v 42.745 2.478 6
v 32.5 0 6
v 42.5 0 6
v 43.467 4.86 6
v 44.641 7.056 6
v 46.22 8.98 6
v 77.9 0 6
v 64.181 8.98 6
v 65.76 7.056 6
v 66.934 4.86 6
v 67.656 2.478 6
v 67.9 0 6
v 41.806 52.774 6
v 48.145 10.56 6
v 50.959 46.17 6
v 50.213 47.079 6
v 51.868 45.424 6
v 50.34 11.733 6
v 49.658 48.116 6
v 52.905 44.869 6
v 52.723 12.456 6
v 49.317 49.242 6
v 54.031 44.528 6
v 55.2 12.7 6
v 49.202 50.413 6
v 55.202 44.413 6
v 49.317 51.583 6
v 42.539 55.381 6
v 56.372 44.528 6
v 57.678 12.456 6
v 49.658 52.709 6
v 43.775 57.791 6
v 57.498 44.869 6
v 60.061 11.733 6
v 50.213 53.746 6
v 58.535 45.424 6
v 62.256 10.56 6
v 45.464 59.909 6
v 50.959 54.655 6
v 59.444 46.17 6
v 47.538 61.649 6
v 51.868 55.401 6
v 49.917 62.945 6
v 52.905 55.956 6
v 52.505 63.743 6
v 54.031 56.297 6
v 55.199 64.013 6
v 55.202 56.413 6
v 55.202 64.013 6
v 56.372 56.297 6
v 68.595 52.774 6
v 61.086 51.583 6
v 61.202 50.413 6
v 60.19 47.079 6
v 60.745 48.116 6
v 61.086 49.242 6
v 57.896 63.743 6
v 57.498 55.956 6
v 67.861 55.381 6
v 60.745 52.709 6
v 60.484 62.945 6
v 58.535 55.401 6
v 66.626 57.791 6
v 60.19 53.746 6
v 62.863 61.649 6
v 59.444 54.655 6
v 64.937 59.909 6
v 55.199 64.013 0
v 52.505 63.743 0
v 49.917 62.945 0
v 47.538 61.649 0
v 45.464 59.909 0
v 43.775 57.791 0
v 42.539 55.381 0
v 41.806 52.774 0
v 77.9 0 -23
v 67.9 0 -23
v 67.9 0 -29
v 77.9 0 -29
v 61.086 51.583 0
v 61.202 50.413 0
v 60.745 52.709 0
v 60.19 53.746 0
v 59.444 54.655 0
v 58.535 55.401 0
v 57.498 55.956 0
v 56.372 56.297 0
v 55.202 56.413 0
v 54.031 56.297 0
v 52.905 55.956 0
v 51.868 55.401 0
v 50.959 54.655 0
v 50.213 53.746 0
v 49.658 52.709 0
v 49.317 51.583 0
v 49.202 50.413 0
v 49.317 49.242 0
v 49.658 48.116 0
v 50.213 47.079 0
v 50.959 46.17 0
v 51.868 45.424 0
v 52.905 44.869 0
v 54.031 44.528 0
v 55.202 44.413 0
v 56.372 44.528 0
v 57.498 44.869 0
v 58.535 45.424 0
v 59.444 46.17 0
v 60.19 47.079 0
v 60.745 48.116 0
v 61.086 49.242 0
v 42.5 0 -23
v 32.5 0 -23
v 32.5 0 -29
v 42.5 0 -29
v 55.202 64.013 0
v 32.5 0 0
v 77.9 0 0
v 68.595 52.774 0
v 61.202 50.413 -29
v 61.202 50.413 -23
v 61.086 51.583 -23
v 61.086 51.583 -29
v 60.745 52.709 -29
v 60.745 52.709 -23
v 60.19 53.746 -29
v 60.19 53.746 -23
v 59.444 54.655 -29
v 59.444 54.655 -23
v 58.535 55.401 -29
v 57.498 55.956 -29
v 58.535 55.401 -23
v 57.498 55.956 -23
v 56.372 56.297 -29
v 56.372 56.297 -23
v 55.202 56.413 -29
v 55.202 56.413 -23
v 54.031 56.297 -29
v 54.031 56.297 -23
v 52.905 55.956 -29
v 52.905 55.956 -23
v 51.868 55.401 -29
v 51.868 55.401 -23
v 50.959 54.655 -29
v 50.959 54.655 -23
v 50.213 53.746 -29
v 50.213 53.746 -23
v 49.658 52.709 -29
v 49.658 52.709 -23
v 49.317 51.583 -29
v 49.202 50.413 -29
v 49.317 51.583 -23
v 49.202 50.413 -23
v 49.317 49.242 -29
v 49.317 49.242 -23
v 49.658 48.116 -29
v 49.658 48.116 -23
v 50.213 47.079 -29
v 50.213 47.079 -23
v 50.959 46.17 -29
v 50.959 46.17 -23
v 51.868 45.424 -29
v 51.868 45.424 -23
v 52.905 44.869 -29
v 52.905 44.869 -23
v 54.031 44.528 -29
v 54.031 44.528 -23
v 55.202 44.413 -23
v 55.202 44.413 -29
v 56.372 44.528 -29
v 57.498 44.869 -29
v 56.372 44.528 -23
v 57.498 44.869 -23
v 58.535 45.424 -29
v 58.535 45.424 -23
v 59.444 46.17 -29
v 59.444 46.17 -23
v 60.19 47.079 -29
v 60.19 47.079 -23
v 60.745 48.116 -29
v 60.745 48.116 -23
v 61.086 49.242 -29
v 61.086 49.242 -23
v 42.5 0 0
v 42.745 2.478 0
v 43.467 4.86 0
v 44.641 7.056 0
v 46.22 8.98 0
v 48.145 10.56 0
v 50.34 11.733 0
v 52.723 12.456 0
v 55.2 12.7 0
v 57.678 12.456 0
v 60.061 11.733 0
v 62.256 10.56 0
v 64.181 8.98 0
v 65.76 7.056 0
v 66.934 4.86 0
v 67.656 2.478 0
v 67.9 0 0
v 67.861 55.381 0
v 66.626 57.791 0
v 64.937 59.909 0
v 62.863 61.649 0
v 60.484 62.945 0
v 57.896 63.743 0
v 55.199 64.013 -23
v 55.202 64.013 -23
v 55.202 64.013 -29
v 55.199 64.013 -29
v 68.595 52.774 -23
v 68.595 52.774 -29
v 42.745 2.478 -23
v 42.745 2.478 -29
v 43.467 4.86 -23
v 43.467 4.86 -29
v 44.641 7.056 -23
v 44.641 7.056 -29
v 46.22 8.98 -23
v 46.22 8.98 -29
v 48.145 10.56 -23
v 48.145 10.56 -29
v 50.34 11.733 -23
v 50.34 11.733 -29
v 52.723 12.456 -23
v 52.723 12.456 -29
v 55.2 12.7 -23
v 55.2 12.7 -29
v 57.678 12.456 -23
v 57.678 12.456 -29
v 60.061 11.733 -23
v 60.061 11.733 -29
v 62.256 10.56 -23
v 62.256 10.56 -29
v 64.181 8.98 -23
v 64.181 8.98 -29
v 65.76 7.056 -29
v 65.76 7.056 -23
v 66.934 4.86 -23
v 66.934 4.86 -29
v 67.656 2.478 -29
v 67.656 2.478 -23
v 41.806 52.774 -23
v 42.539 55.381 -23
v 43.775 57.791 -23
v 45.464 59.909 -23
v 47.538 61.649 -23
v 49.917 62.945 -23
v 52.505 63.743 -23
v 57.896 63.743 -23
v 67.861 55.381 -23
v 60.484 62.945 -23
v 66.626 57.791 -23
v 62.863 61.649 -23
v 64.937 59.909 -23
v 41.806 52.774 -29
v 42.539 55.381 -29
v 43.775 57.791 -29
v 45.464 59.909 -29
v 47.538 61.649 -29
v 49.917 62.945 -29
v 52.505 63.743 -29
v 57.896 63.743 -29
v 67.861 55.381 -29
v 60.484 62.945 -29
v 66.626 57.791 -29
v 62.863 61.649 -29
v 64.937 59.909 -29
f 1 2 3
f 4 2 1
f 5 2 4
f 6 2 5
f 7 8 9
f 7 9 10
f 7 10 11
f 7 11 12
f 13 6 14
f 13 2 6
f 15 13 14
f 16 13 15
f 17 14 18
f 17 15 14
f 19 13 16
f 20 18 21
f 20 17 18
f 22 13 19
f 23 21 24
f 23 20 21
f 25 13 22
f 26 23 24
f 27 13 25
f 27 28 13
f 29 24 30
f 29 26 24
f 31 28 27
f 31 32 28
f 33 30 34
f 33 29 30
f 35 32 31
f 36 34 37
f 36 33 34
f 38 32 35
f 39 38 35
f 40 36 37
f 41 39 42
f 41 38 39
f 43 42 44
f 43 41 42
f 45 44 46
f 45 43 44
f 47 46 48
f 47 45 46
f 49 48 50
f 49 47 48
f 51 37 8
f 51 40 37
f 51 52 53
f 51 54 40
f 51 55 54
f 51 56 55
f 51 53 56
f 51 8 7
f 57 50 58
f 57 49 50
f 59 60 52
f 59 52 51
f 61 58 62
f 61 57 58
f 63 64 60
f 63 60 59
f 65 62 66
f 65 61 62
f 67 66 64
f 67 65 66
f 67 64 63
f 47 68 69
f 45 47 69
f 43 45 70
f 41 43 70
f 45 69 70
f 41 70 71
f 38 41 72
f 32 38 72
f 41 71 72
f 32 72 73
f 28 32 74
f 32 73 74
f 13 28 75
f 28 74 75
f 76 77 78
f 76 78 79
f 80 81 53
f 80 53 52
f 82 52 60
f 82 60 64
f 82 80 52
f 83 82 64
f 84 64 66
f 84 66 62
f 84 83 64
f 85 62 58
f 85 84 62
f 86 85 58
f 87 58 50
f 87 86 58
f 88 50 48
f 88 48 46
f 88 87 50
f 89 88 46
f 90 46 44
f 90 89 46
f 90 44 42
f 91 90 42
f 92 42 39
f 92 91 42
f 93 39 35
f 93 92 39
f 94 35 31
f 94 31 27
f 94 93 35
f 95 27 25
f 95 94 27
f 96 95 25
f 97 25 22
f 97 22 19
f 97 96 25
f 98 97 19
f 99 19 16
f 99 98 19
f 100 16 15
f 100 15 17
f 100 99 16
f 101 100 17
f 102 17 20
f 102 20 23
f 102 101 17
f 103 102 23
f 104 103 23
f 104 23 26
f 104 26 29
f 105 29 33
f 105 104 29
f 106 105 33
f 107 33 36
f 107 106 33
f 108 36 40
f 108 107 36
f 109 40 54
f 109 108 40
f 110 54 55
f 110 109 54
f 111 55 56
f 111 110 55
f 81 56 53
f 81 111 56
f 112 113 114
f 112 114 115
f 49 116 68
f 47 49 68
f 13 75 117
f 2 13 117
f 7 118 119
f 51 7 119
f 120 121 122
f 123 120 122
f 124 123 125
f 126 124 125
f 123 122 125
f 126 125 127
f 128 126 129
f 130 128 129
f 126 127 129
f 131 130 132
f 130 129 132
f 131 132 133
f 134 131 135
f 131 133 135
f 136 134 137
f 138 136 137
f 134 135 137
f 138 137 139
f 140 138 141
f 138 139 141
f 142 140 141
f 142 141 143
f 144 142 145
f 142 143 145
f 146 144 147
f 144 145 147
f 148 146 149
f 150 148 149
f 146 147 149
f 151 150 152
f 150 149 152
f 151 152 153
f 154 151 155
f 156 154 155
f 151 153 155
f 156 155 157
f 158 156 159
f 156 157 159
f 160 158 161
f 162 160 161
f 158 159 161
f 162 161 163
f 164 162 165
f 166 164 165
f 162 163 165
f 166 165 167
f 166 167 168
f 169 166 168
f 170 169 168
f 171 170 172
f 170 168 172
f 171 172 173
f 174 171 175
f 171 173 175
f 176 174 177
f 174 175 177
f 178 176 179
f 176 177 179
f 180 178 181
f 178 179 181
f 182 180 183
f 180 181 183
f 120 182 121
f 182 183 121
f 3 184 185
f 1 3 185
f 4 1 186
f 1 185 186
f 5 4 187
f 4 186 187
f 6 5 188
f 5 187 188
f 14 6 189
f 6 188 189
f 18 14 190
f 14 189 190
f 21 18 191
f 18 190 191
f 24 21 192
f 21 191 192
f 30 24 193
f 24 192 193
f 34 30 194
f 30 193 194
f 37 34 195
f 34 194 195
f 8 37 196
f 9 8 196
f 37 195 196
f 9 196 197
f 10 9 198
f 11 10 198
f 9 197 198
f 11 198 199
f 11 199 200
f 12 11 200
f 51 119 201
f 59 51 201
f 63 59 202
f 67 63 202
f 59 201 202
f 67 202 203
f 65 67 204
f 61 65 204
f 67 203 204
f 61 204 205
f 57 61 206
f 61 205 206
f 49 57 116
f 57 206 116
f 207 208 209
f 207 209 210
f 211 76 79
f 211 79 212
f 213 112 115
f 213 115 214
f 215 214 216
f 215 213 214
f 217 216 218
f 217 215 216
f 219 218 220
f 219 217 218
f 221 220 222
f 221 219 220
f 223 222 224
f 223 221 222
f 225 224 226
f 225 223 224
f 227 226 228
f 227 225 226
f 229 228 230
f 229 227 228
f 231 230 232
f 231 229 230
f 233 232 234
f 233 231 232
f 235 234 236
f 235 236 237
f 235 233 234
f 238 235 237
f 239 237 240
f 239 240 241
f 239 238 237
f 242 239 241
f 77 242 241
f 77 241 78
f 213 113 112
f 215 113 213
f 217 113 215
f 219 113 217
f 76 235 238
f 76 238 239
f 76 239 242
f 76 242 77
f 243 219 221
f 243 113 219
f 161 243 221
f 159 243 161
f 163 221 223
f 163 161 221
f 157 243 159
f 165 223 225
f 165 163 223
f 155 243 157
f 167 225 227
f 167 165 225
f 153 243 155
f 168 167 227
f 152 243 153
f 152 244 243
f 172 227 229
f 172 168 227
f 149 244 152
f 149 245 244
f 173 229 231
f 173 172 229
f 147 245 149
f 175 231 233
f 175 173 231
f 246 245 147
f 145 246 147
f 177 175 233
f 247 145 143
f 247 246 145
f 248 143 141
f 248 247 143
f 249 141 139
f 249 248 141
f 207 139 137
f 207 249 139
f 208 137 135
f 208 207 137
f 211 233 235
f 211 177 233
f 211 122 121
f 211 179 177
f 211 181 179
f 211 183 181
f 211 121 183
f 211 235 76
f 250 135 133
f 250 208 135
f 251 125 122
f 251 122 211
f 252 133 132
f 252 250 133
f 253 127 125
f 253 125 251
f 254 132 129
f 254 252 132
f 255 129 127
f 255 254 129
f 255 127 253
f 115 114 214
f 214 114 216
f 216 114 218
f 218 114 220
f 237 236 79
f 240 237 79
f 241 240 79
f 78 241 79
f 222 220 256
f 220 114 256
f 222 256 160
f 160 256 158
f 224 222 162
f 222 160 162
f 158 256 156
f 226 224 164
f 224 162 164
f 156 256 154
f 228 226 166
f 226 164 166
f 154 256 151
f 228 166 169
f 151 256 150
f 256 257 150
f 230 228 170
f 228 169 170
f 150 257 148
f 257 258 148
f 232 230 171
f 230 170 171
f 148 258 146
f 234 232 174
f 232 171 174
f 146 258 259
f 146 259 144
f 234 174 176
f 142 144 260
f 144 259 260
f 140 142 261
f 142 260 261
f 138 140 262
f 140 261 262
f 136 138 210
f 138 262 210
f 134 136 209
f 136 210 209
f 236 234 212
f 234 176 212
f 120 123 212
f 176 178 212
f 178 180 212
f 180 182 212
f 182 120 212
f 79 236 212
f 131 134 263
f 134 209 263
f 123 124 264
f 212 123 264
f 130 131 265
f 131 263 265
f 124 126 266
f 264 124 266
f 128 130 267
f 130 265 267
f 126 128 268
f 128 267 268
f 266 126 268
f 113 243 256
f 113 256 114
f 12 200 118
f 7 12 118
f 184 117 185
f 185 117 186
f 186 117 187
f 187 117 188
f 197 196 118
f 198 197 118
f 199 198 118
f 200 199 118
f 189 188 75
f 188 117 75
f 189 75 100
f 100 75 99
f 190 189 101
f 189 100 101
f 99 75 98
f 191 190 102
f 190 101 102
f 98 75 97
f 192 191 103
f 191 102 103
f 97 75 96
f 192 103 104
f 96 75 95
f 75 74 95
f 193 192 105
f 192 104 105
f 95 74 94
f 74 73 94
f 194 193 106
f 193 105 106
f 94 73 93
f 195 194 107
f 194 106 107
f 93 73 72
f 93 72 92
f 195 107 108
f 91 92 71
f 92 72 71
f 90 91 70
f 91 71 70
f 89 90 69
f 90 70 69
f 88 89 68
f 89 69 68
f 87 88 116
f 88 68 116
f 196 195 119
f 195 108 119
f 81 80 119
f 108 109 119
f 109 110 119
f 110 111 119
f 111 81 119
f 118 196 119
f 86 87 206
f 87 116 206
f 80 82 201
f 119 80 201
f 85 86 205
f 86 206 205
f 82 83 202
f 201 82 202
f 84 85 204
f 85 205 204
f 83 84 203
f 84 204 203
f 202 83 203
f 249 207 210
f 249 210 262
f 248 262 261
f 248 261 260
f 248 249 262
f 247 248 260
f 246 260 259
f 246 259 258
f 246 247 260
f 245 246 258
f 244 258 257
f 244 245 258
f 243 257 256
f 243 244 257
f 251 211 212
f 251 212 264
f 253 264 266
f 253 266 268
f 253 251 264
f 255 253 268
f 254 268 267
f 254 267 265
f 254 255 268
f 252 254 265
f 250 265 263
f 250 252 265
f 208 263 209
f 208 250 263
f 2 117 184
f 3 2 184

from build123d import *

# Parameters (mm, degrees)
SKETCH2_R           = 6
BOSS_EXTRUDE1_DEPTH = 6


with BuildPart() as part:
    # Sketch2 → Boss-Extrude1 (new body)
    with BuildSketch(Plane.XY):
        with BuildLine():
            Line((41.80598397, 52.774119162), (32.500482879, 0))
            Line((32.500482879, 0), (42.500482879, 0))
            ThreePointArc((42.500482879, 0), (55.200482879, 12.7), (67.900482879, 0))
            Line((67.900482879, 0), (77.900482879, 0))
            Line((77.900482879, 0), (68.594981787, 52.774119162))
            ThreePointArc((68.594981787, 52.774119162), (63.943507838, 60.830708372), (55.201596346, 64.012503946))
            Line((55.201596346, 64.012503946), (55.199369411, 64.012503946))
            ThreePointArc((55.199369411, 64.012503946), (46.457457919, 60.830708372), (41.80598397, 52.774119162))
        make_face()
        with Locations((55.201596346, 50.412503946)):
            Circle(SKETCH2_R, mode=Mode.SUBTRACT)
    extrude(amount=BOSS_EXTRUDE1_DEPTH)


with BuildPart() as body_2:
    # Mirror2: mirrored copy
    add(part.part.mirror(Plane(origin=(0, 0, -11.5), x_dir=(1, 0, 0), z_dir=(0, 0, -1))))


solid = Compound([part.part, body_2.part])
